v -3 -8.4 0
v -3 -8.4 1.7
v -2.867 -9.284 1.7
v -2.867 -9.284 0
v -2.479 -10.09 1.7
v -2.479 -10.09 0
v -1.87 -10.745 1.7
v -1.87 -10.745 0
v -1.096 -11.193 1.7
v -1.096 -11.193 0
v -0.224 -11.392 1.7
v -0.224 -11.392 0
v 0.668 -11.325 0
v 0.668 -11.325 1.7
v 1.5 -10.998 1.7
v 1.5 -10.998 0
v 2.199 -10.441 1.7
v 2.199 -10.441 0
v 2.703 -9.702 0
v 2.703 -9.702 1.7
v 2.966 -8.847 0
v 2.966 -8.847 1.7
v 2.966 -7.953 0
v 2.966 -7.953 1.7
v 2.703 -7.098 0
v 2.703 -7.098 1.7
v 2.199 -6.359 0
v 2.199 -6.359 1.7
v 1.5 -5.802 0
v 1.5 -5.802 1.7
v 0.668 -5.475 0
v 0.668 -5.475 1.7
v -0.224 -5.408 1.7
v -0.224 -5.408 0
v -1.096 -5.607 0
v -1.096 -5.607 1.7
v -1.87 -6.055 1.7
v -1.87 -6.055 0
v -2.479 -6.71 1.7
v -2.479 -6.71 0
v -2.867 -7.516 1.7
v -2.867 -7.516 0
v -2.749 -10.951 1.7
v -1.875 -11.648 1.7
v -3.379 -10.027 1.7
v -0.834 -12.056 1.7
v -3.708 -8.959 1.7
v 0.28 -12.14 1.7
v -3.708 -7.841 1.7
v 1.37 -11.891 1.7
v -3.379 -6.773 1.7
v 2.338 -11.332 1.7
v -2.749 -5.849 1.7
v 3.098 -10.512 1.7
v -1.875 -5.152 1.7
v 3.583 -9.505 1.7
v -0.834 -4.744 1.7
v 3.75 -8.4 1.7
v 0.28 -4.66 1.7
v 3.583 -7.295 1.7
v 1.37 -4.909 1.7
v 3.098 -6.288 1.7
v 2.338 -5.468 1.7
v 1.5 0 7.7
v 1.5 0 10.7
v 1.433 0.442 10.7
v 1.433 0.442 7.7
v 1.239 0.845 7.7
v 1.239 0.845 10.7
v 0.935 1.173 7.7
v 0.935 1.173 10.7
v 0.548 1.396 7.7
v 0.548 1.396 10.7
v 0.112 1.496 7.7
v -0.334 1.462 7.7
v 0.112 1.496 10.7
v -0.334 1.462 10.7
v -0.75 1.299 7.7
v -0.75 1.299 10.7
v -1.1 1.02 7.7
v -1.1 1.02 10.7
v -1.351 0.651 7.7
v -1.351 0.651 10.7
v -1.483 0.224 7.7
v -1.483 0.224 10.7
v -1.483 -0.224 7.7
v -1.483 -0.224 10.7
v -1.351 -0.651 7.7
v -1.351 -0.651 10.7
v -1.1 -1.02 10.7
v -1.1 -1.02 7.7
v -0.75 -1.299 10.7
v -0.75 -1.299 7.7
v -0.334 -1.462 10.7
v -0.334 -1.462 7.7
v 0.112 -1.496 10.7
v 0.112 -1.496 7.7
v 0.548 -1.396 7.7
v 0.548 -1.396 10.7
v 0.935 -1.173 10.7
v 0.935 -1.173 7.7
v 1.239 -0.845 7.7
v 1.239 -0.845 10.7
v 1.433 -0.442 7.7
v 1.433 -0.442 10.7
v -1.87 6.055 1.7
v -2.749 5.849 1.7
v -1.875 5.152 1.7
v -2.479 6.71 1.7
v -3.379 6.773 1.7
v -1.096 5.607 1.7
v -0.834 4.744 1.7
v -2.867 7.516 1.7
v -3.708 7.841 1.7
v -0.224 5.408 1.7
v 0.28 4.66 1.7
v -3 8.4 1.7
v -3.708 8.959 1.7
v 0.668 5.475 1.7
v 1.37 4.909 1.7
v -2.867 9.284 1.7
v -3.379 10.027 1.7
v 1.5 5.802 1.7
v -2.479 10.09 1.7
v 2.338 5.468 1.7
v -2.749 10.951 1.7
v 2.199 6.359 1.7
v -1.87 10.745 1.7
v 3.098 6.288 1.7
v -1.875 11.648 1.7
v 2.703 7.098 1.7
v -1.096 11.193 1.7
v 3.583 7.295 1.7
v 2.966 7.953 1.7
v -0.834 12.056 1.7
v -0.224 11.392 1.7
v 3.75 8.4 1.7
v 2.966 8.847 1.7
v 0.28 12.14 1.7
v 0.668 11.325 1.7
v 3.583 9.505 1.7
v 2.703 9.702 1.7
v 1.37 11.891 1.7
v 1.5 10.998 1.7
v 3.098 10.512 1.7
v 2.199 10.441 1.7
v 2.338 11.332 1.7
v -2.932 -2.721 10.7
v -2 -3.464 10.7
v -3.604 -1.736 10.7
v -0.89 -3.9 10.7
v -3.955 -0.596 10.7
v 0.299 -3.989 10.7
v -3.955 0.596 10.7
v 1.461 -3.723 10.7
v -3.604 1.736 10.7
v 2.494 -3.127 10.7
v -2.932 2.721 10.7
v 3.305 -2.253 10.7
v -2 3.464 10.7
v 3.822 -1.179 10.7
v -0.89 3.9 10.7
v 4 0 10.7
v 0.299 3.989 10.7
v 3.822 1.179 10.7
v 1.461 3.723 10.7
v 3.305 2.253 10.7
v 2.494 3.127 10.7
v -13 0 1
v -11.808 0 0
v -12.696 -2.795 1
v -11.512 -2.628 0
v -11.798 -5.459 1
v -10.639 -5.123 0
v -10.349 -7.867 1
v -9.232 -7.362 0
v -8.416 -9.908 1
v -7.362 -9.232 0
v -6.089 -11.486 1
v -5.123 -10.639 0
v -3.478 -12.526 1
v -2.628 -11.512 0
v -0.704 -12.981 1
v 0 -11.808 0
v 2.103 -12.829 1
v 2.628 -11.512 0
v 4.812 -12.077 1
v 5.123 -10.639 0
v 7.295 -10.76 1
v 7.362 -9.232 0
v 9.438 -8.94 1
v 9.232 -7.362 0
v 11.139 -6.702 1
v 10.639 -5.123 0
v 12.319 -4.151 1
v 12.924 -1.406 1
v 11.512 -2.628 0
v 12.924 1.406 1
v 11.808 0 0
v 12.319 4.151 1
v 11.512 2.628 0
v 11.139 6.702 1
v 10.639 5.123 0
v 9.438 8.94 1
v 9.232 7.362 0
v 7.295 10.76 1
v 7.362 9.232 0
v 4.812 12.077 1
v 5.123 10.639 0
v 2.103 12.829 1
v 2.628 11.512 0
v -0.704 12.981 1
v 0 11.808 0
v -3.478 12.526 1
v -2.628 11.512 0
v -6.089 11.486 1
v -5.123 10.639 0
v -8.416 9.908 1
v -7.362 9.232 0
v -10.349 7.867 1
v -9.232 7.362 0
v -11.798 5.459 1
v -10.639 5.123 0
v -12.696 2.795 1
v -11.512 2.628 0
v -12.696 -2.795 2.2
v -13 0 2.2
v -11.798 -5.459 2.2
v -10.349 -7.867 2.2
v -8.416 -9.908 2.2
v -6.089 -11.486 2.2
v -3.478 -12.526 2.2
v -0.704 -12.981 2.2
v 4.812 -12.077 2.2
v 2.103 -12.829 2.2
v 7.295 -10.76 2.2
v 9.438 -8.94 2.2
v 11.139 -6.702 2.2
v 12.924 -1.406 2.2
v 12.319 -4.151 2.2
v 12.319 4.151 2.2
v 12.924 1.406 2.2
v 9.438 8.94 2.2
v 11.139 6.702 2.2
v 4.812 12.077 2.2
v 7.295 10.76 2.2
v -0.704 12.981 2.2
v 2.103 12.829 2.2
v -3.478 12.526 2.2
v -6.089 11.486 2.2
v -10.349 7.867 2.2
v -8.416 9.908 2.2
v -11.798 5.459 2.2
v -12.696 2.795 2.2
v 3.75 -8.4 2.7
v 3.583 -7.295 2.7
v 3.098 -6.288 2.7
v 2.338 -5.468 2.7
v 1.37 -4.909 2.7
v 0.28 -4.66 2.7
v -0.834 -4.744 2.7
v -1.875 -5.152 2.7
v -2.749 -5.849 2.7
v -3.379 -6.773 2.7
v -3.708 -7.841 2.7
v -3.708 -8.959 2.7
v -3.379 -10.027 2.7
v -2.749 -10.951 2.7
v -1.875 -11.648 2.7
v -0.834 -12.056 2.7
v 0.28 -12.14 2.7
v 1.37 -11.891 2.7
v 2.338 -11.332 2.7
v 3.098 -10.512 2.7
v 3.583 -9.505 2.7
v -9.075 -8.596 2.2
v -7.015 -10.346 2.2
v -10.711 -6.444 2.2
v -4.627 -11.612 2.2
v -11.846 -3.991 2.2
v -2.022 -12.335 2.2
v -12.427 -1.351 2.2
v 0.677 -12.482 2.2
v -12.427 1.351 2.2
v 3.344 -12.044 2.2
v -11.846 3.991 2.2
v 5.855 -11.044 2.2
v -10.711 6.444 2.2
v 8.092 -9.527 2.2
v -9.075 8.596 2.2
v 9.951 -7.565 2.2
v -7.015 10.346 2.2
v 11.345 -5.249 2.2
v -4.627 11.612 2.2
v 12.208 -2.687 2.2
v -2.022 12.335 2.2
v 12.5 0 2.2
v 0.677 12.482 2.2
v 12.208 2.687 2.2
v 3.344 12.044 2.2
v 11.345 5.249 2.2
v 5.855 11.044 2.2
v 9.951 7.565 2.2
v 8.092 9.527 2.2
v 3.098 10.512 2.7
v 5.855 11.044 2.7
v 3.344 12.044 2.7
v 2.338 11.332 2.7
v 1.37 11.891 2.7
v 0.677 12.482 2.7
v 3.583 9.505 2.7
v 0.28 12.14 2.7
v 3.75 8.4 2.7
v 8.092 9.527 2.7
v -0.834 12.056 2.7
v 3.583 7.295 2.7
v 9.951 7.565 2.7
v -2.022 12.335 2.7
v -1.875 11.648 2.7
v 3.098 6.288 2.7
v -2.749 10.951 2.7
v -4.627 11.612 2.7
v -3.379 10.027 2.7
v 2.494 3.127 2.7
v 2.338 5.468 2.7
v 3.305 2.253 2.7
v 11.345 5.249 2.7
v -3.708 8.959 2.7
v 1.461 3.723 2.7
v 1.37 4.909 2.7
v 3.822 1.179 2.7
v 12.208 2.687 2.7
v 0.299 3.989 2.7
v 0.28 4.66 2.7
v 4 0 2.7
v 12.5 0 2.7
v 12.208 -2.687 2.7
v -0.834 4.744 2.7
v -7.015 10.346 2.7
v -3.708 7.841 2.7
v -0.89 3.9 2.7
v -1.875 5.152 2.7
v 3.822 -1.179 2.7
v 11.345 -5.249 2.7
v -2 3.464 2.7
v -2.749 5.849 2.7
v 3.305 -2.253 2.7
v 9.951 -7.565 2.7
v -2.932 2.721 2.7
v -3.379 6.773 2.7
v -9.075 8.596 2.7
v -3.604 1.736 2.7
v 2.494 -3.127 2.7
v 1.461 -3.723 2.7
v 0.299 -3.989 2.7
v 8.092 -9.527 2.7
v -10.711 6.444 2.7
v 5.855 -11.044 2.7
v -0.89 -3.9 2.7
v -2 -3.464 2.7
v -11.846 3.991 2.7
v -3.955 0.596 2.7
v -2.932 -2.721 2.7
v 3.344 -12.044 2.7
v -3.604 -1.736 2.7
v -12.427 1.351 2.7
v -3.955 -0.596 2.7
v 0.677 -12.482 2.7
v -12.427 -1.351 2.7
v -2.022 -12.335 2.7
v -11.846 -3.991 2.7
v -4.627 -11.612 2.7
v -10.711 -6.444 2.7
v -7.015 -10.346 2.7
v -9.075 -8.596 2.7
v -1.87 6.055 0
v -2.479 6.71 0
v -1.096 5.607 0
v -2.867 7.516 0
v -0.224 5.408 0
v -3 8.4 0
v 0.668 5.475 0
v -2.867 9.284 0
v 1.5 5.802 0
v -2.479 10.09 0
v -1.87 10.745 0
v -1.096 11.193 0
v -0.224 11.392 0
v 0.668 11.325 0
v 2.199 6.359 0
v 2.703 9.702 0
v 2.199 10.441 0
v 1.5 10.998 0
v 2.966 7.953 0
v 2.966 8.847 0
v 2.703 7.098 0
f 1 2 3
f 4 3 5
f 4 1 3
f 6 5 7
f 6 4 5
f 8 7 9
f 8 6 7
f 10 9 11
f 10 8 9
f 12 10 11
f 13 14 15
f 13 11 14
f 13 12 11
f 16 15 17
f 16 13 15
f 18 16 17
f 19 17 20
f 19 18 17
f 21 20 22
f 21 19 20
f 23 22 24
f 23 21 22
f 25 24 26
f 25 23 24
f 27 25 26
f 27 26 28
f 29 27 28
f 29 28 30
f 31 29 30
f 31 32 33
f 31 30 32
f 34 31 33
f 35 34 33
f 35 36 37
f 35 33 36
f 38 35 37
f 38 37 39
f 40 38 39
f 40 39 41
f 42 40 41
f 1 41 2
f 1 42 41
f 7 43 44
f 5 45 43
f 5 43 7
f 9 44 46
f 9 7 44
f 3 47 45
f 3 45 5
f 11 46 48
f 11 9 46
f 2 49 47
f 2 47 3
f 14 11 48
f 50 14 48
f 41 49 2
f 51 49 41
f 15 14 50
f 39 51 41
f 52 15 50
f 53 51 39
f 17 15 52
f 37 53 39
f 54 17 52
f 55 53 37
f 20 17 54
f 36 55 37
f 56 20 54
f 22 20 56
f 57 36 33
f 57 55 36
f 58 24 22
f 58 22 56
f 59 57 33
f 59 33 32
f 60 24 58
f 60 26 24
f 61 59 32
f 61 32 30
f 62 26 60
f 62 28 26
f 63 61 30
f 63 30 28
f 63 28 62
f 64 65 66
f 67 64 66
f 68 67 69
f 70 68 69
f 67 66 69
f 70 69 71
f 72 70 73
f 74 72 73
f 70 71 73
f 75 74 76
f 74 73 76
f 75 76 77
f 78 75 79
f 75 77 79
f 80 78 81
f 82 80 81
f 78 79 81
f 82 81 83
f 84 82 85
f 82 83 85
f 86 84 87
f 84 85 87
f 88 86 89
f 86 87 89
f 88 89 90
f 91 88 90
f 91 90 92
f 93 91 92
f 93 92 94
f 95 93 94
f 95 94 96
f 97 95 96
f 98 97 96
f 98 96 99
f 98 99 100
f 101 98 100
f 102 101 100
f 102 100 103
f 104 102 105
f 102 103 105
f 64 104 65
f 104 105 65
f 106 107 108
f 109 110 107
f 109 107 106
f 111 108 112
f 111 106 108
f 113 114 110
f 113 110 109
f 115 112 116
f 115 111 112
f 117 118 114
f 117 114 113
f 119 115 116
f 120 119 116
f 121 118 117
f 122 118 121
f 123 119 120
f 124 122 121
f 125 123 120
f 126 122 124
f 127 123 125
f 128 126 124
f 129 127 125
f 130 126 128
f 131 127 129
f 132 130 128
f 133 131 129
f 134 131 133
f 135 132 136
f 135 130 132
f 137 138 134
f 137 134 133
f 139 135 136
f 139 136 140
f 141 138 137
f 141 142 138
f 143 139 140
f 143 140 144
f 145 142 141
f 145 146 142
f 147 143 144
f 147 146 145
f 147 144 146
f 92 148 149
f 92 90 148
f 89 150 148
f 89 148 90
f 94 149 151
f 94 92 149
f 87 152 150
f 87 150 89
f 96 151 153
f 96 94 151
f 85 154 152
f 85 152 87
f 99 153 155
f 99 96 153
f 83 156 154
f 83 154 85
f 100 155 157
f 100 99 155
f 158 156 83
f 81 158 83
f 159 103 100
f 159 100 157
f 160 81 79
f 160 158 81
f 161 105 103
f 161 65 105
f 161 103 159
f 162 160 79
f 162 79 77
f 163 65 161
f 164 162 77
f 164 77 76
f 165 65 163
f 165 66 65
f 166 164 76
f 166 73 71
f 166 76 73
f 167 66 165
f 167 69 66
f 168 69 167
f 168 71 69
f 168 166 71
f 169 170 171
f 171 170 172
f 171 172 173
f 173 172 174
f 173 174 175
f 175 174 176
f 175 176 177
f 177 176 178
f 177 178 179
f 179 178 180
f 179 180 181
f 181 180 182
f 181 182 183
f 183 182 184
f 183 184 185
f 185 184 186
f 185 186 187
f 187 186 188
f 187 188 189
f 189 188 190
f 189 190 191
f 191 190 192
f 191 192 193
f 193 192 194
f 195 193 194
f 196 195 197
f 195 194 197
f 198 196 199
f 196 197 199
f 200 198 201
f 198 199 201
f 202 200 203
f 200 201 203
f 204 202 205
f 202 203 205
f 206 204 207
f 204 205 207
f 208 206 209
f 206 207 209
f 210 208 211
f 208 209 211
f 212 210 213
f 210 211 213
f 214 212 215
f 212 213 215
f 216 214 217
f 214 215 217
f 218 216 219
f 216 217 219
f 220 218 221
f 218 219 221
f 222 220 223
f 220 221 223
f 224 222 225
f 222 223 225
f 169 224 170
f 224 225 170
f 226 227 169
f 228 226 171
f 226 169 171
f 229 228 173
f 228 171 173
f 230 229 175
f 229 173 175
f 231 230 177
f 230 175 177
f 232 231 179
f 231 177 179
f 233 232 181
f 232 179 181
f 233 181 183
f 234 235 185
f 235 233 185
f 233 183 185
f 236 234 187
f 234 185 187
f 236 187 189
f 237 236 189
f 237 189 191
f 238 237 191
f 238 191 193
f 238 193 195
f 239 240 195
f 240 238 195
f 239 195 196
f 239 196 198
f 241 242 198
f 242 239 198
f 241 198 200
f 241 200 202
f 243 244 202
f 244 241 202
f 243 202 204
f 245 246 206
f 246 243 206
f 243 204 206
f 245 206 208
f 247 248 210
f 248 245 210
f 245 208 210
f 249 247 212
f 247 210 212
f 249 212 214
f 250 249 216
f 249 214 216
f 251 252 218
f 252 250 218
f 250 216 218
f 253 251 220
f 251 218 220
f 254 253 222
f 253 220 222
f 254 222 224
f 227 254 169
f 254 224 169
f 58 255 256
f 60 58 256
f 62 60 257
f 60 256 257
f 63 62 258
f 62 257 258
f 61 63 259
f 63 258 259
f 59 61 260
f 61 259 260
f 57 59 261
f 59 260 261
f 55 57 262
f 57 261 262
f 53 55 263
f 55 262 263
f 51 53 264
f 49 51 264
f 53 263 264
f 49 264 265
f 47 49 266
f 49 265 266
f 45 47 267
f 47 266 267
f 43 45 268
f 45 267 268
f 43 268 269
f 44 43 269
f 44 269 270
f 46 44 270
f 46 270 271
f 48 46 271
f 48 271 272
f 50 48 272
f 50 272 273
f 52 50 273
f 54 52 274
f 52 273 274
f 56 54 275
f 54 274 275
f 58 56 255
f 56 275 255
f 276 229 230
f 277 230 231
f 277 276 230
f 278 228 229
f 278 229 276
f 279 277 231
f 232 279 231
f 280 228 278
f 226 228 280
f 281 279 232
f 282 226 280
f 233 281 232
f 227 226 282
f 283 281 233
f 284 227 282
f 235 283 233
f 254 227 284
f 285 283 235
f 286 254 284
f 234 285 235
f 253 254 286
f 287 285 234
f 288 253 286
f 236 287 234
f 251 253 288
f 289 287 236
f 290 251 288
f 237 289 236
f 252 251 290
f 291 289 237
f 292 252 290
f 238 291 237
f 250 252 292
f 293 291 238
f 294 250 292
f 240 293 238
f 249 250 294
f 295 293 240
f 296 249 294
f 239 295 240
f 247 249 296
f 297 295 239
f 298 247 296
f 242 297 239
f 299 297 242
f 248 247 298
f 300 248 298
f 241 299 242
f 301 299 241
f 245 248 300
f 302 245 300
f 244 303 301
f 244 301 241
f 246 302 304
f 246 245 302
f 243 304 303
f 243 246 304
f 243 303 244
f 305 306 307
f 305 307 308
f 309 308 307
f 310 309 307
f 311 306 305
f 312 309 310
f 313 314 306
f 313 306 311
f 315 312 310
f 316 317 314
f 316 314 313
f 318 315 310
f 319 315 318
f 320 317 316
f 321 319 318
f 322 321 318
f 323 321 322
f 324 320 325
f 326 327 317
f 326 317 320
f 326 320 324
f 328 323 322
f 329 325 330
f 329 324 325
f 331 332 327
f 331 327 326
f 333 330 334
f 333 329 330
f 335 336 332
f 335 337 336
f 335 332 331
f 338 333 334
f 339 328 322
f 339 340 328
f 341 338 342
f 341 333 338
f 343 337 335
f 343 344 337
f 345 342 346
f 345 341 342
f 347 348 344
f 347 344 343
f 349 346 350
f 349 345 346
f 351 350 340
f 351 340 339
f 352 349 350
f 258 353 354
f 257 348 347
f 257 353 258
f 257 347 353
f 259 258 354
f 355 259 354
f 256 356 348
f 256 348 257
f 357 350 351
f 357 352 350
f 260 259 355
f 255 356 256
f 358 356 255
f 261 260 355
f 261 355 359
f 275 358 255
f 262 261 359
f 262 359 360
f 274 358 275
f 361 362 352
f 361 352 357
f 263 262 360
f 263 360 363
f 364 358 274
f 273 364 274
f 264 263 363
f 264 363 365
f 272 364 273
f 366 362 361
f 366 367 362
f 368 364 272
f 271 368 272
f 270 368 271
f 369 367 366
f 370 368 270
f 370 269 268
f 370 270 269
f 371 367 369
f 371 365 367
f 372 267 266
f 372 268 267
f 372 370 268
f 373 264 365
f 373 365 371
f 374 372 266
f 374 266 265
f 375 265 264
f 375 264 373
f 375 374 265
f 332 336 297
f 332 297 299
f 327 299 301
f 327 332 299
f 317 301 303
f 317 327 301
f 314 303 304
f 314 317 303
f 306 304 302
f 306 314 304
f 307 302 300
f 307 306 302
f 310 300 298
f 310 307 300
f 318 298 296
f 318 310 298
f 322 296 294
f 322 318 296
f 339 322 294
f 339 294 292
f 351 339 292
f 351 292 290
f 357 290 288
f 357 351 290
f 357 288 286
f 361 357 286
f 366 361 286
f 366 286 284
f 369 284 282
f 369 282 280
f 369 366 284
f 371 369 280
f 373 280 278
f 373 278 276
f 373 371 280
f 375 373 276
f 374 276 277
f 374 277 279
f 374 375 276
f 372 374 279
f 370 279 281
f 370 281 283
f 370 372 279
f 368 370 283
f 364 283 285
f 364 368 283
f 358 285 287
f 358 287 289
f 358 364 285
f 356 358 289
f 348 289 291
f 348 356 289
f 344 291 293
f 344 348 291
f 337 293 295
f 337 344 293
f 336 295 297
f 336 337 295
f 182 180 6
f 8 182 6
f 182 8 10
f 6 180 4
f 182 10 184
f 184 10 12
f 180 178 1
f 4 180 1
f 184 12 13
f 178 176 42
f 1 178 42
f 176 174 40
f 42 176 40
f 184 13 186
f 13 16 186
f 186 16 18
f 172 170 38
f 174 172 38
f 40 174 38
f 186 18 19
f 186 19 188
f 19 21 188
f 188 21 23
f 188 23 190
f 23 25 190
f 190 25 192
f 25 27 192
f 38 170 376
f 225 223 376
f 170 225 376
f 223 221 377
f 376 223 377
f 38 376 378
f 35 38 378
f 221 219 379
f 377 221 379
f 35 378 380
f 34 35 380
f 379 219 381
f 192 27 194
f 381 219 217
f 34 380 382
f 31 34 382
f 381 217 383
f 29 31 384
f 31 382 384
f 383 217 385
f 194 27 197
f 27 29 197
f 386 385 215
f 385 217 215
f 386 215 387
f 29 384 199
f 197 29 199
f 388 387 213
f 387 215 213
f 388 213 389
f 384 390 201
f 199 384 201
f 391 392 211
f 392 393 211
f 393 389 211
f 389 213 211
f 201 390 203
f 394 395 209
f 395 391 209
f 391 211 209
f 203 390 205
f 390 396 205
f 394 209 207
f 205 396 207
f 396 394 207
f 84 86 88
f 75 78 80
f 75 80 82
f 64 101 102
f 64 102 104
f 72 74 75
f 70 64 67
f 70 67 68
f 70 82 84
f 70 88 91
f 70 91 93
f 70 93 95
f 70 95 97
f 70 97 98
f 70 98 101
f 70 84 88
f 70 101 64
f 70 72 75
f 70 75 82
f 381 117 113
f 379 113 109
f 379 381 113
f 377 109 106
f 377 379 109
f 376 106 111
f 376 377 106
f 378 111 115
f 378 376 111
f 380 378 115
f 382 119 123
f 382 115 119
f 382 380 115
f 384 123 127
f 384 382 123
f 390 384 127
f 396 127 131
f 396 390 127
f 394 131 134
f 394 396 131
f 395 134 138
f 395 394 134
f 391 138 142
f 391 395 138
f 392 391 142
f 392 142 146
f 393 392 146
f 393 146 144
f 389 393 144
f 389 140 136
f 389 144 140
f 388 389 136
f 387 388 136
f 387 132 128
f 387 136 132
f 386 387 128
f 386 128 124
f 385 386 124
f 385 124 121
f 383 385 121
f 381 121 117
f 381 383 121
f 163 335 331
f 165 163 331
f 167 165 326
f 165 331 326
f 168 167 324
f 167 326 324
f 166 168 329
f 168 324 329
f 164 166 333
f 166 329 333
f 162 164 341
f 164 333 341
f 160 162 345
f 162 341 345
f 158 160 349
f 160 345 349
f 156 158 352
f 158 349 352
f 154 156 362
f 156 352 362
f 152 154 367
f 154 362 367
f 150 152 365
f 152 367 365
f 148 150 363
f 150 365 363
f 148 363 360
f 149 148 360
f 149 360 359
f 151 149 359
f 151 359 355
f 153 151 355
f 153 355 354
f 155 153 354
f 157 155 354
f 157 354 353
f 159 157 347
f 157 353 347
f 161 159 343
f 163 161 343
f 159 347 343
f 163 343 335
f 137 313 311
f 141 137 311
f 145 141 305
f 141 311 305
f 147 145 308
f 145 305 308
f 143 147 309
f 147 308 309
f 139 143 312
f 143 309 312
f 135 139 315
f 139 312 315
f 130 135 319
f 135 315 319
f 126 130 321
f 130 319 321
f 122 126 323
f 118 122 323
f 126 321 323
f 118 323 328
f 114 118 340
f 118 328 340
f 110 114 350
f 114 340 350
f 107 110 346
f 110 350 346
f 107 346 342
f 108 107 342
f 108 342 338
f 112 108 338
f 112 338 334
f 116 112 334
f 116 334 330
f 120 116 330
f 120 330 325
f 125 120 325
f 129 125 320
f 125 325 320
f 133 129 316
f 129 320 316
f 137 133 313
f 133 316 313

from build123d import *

# Parameters (mm, degrees)
ESQUISSE1_R             = 13
ESQUISSE1_R_2           = 3
BOSS_EXTRU_1_DEPTH      = 2.7
CHANFREIN1_SIZE         = 1
CHANFREIN1_SIZE2        = 1.191753593
ESQUISSE3_R             = 3.75
ENL_V_MAT_EXTRU_1_DEPTH = 1
ESQUISSE5_R             = 17.5
ESQUISSE5_R_2           = 12.5
ENL_V_MAT_EXTRU_3_DEPTH = 0.5
ESQUISSE7_R             = 4
BOSS_EXTRU_2_DEPTH      = 8
ESQUISSE8_R             = 1.5
ENL_V_MAT_EXTRU_5_DEPTH = 3


with BuildPart() as part:
    # Esquisse1 → Boss.-Extru.1 (new body)
    with BuildSketch(Plane.XY):
        Circle(ESQUISSE1_R)
        with Locations((0, -8.4)):
            Circle(ESQUISSE1_R_2, mode=Mode.SUBTRACT)
        with Locations((0, 8.4)):
            Circle(ESQUISSE1_R_2, mode=Mode.SUBTRACT)
    extrude(amount=BOSS_EXTRU_1_DEPTH)

    # Chanfrein1
    chanfrein1_edges = [part.edges().sort_by_distance(p)[0] for p in [
        (-13, 0, 0),
    ]]
    chanfrein1_side = [part.faces().sort_by_distance(p)[0] for p in [
        (-13, 0, 1.35),
    ]]
    chamfer(chanfrein1_edges, length=CHANFREIN1_SIZE, length2=CHANFREIN1_SIZE2, reference=chanfrein1_side[0])

    # Esquisse3 → Enlèv. mat.-Extru.1 (cut)
    with BuildSketch(Plane.XY.offset(2.7)):
        with Locations((0, 8.4)):
            Circle(ESQUISSE3_R)
        with Locations((0, -8.4)):
            Circle(ESQUISSE3_R)
    extrude(amount=-ENL_V_MAT_EXTRU_1_DEPTH, mode=Mode.SUBTRACT)

    # Esquisse5 → Enlèv. mat.-Extru.3 (cut)
    with BuildSketch(Plane.XY.offset(2.7)):
        Circle(ESQUISSE5_R)
        Circle(ESQUISSE5_R_2, mode=Mode.SUBTRACT)
    extrude(amount=-ENL_V_MAT_EXTRU_3_DEPTH, mode=Mode.SUBTRACT)

    # Esquisse7 → Boss.-Extru.2 (add)
    with BuildSketch(Plane.XY.offset(2.7)):
        Circle(ESQUISSE7_R)
    extrude(amount=BOSS_EXTRU_2_DEPTH)

    # Esquisse8 → Enlèv. mat.-Extru.5 (cut)
    with BuildSketch(Plane.XY.offset(10.7)):
        Circle(ESQUISSE8_R)
    extrude(amount=-ENL_V_MAT_EXTRU_5_DEPTH, mode=Mode.SUBTRACT)


solid = part.part
